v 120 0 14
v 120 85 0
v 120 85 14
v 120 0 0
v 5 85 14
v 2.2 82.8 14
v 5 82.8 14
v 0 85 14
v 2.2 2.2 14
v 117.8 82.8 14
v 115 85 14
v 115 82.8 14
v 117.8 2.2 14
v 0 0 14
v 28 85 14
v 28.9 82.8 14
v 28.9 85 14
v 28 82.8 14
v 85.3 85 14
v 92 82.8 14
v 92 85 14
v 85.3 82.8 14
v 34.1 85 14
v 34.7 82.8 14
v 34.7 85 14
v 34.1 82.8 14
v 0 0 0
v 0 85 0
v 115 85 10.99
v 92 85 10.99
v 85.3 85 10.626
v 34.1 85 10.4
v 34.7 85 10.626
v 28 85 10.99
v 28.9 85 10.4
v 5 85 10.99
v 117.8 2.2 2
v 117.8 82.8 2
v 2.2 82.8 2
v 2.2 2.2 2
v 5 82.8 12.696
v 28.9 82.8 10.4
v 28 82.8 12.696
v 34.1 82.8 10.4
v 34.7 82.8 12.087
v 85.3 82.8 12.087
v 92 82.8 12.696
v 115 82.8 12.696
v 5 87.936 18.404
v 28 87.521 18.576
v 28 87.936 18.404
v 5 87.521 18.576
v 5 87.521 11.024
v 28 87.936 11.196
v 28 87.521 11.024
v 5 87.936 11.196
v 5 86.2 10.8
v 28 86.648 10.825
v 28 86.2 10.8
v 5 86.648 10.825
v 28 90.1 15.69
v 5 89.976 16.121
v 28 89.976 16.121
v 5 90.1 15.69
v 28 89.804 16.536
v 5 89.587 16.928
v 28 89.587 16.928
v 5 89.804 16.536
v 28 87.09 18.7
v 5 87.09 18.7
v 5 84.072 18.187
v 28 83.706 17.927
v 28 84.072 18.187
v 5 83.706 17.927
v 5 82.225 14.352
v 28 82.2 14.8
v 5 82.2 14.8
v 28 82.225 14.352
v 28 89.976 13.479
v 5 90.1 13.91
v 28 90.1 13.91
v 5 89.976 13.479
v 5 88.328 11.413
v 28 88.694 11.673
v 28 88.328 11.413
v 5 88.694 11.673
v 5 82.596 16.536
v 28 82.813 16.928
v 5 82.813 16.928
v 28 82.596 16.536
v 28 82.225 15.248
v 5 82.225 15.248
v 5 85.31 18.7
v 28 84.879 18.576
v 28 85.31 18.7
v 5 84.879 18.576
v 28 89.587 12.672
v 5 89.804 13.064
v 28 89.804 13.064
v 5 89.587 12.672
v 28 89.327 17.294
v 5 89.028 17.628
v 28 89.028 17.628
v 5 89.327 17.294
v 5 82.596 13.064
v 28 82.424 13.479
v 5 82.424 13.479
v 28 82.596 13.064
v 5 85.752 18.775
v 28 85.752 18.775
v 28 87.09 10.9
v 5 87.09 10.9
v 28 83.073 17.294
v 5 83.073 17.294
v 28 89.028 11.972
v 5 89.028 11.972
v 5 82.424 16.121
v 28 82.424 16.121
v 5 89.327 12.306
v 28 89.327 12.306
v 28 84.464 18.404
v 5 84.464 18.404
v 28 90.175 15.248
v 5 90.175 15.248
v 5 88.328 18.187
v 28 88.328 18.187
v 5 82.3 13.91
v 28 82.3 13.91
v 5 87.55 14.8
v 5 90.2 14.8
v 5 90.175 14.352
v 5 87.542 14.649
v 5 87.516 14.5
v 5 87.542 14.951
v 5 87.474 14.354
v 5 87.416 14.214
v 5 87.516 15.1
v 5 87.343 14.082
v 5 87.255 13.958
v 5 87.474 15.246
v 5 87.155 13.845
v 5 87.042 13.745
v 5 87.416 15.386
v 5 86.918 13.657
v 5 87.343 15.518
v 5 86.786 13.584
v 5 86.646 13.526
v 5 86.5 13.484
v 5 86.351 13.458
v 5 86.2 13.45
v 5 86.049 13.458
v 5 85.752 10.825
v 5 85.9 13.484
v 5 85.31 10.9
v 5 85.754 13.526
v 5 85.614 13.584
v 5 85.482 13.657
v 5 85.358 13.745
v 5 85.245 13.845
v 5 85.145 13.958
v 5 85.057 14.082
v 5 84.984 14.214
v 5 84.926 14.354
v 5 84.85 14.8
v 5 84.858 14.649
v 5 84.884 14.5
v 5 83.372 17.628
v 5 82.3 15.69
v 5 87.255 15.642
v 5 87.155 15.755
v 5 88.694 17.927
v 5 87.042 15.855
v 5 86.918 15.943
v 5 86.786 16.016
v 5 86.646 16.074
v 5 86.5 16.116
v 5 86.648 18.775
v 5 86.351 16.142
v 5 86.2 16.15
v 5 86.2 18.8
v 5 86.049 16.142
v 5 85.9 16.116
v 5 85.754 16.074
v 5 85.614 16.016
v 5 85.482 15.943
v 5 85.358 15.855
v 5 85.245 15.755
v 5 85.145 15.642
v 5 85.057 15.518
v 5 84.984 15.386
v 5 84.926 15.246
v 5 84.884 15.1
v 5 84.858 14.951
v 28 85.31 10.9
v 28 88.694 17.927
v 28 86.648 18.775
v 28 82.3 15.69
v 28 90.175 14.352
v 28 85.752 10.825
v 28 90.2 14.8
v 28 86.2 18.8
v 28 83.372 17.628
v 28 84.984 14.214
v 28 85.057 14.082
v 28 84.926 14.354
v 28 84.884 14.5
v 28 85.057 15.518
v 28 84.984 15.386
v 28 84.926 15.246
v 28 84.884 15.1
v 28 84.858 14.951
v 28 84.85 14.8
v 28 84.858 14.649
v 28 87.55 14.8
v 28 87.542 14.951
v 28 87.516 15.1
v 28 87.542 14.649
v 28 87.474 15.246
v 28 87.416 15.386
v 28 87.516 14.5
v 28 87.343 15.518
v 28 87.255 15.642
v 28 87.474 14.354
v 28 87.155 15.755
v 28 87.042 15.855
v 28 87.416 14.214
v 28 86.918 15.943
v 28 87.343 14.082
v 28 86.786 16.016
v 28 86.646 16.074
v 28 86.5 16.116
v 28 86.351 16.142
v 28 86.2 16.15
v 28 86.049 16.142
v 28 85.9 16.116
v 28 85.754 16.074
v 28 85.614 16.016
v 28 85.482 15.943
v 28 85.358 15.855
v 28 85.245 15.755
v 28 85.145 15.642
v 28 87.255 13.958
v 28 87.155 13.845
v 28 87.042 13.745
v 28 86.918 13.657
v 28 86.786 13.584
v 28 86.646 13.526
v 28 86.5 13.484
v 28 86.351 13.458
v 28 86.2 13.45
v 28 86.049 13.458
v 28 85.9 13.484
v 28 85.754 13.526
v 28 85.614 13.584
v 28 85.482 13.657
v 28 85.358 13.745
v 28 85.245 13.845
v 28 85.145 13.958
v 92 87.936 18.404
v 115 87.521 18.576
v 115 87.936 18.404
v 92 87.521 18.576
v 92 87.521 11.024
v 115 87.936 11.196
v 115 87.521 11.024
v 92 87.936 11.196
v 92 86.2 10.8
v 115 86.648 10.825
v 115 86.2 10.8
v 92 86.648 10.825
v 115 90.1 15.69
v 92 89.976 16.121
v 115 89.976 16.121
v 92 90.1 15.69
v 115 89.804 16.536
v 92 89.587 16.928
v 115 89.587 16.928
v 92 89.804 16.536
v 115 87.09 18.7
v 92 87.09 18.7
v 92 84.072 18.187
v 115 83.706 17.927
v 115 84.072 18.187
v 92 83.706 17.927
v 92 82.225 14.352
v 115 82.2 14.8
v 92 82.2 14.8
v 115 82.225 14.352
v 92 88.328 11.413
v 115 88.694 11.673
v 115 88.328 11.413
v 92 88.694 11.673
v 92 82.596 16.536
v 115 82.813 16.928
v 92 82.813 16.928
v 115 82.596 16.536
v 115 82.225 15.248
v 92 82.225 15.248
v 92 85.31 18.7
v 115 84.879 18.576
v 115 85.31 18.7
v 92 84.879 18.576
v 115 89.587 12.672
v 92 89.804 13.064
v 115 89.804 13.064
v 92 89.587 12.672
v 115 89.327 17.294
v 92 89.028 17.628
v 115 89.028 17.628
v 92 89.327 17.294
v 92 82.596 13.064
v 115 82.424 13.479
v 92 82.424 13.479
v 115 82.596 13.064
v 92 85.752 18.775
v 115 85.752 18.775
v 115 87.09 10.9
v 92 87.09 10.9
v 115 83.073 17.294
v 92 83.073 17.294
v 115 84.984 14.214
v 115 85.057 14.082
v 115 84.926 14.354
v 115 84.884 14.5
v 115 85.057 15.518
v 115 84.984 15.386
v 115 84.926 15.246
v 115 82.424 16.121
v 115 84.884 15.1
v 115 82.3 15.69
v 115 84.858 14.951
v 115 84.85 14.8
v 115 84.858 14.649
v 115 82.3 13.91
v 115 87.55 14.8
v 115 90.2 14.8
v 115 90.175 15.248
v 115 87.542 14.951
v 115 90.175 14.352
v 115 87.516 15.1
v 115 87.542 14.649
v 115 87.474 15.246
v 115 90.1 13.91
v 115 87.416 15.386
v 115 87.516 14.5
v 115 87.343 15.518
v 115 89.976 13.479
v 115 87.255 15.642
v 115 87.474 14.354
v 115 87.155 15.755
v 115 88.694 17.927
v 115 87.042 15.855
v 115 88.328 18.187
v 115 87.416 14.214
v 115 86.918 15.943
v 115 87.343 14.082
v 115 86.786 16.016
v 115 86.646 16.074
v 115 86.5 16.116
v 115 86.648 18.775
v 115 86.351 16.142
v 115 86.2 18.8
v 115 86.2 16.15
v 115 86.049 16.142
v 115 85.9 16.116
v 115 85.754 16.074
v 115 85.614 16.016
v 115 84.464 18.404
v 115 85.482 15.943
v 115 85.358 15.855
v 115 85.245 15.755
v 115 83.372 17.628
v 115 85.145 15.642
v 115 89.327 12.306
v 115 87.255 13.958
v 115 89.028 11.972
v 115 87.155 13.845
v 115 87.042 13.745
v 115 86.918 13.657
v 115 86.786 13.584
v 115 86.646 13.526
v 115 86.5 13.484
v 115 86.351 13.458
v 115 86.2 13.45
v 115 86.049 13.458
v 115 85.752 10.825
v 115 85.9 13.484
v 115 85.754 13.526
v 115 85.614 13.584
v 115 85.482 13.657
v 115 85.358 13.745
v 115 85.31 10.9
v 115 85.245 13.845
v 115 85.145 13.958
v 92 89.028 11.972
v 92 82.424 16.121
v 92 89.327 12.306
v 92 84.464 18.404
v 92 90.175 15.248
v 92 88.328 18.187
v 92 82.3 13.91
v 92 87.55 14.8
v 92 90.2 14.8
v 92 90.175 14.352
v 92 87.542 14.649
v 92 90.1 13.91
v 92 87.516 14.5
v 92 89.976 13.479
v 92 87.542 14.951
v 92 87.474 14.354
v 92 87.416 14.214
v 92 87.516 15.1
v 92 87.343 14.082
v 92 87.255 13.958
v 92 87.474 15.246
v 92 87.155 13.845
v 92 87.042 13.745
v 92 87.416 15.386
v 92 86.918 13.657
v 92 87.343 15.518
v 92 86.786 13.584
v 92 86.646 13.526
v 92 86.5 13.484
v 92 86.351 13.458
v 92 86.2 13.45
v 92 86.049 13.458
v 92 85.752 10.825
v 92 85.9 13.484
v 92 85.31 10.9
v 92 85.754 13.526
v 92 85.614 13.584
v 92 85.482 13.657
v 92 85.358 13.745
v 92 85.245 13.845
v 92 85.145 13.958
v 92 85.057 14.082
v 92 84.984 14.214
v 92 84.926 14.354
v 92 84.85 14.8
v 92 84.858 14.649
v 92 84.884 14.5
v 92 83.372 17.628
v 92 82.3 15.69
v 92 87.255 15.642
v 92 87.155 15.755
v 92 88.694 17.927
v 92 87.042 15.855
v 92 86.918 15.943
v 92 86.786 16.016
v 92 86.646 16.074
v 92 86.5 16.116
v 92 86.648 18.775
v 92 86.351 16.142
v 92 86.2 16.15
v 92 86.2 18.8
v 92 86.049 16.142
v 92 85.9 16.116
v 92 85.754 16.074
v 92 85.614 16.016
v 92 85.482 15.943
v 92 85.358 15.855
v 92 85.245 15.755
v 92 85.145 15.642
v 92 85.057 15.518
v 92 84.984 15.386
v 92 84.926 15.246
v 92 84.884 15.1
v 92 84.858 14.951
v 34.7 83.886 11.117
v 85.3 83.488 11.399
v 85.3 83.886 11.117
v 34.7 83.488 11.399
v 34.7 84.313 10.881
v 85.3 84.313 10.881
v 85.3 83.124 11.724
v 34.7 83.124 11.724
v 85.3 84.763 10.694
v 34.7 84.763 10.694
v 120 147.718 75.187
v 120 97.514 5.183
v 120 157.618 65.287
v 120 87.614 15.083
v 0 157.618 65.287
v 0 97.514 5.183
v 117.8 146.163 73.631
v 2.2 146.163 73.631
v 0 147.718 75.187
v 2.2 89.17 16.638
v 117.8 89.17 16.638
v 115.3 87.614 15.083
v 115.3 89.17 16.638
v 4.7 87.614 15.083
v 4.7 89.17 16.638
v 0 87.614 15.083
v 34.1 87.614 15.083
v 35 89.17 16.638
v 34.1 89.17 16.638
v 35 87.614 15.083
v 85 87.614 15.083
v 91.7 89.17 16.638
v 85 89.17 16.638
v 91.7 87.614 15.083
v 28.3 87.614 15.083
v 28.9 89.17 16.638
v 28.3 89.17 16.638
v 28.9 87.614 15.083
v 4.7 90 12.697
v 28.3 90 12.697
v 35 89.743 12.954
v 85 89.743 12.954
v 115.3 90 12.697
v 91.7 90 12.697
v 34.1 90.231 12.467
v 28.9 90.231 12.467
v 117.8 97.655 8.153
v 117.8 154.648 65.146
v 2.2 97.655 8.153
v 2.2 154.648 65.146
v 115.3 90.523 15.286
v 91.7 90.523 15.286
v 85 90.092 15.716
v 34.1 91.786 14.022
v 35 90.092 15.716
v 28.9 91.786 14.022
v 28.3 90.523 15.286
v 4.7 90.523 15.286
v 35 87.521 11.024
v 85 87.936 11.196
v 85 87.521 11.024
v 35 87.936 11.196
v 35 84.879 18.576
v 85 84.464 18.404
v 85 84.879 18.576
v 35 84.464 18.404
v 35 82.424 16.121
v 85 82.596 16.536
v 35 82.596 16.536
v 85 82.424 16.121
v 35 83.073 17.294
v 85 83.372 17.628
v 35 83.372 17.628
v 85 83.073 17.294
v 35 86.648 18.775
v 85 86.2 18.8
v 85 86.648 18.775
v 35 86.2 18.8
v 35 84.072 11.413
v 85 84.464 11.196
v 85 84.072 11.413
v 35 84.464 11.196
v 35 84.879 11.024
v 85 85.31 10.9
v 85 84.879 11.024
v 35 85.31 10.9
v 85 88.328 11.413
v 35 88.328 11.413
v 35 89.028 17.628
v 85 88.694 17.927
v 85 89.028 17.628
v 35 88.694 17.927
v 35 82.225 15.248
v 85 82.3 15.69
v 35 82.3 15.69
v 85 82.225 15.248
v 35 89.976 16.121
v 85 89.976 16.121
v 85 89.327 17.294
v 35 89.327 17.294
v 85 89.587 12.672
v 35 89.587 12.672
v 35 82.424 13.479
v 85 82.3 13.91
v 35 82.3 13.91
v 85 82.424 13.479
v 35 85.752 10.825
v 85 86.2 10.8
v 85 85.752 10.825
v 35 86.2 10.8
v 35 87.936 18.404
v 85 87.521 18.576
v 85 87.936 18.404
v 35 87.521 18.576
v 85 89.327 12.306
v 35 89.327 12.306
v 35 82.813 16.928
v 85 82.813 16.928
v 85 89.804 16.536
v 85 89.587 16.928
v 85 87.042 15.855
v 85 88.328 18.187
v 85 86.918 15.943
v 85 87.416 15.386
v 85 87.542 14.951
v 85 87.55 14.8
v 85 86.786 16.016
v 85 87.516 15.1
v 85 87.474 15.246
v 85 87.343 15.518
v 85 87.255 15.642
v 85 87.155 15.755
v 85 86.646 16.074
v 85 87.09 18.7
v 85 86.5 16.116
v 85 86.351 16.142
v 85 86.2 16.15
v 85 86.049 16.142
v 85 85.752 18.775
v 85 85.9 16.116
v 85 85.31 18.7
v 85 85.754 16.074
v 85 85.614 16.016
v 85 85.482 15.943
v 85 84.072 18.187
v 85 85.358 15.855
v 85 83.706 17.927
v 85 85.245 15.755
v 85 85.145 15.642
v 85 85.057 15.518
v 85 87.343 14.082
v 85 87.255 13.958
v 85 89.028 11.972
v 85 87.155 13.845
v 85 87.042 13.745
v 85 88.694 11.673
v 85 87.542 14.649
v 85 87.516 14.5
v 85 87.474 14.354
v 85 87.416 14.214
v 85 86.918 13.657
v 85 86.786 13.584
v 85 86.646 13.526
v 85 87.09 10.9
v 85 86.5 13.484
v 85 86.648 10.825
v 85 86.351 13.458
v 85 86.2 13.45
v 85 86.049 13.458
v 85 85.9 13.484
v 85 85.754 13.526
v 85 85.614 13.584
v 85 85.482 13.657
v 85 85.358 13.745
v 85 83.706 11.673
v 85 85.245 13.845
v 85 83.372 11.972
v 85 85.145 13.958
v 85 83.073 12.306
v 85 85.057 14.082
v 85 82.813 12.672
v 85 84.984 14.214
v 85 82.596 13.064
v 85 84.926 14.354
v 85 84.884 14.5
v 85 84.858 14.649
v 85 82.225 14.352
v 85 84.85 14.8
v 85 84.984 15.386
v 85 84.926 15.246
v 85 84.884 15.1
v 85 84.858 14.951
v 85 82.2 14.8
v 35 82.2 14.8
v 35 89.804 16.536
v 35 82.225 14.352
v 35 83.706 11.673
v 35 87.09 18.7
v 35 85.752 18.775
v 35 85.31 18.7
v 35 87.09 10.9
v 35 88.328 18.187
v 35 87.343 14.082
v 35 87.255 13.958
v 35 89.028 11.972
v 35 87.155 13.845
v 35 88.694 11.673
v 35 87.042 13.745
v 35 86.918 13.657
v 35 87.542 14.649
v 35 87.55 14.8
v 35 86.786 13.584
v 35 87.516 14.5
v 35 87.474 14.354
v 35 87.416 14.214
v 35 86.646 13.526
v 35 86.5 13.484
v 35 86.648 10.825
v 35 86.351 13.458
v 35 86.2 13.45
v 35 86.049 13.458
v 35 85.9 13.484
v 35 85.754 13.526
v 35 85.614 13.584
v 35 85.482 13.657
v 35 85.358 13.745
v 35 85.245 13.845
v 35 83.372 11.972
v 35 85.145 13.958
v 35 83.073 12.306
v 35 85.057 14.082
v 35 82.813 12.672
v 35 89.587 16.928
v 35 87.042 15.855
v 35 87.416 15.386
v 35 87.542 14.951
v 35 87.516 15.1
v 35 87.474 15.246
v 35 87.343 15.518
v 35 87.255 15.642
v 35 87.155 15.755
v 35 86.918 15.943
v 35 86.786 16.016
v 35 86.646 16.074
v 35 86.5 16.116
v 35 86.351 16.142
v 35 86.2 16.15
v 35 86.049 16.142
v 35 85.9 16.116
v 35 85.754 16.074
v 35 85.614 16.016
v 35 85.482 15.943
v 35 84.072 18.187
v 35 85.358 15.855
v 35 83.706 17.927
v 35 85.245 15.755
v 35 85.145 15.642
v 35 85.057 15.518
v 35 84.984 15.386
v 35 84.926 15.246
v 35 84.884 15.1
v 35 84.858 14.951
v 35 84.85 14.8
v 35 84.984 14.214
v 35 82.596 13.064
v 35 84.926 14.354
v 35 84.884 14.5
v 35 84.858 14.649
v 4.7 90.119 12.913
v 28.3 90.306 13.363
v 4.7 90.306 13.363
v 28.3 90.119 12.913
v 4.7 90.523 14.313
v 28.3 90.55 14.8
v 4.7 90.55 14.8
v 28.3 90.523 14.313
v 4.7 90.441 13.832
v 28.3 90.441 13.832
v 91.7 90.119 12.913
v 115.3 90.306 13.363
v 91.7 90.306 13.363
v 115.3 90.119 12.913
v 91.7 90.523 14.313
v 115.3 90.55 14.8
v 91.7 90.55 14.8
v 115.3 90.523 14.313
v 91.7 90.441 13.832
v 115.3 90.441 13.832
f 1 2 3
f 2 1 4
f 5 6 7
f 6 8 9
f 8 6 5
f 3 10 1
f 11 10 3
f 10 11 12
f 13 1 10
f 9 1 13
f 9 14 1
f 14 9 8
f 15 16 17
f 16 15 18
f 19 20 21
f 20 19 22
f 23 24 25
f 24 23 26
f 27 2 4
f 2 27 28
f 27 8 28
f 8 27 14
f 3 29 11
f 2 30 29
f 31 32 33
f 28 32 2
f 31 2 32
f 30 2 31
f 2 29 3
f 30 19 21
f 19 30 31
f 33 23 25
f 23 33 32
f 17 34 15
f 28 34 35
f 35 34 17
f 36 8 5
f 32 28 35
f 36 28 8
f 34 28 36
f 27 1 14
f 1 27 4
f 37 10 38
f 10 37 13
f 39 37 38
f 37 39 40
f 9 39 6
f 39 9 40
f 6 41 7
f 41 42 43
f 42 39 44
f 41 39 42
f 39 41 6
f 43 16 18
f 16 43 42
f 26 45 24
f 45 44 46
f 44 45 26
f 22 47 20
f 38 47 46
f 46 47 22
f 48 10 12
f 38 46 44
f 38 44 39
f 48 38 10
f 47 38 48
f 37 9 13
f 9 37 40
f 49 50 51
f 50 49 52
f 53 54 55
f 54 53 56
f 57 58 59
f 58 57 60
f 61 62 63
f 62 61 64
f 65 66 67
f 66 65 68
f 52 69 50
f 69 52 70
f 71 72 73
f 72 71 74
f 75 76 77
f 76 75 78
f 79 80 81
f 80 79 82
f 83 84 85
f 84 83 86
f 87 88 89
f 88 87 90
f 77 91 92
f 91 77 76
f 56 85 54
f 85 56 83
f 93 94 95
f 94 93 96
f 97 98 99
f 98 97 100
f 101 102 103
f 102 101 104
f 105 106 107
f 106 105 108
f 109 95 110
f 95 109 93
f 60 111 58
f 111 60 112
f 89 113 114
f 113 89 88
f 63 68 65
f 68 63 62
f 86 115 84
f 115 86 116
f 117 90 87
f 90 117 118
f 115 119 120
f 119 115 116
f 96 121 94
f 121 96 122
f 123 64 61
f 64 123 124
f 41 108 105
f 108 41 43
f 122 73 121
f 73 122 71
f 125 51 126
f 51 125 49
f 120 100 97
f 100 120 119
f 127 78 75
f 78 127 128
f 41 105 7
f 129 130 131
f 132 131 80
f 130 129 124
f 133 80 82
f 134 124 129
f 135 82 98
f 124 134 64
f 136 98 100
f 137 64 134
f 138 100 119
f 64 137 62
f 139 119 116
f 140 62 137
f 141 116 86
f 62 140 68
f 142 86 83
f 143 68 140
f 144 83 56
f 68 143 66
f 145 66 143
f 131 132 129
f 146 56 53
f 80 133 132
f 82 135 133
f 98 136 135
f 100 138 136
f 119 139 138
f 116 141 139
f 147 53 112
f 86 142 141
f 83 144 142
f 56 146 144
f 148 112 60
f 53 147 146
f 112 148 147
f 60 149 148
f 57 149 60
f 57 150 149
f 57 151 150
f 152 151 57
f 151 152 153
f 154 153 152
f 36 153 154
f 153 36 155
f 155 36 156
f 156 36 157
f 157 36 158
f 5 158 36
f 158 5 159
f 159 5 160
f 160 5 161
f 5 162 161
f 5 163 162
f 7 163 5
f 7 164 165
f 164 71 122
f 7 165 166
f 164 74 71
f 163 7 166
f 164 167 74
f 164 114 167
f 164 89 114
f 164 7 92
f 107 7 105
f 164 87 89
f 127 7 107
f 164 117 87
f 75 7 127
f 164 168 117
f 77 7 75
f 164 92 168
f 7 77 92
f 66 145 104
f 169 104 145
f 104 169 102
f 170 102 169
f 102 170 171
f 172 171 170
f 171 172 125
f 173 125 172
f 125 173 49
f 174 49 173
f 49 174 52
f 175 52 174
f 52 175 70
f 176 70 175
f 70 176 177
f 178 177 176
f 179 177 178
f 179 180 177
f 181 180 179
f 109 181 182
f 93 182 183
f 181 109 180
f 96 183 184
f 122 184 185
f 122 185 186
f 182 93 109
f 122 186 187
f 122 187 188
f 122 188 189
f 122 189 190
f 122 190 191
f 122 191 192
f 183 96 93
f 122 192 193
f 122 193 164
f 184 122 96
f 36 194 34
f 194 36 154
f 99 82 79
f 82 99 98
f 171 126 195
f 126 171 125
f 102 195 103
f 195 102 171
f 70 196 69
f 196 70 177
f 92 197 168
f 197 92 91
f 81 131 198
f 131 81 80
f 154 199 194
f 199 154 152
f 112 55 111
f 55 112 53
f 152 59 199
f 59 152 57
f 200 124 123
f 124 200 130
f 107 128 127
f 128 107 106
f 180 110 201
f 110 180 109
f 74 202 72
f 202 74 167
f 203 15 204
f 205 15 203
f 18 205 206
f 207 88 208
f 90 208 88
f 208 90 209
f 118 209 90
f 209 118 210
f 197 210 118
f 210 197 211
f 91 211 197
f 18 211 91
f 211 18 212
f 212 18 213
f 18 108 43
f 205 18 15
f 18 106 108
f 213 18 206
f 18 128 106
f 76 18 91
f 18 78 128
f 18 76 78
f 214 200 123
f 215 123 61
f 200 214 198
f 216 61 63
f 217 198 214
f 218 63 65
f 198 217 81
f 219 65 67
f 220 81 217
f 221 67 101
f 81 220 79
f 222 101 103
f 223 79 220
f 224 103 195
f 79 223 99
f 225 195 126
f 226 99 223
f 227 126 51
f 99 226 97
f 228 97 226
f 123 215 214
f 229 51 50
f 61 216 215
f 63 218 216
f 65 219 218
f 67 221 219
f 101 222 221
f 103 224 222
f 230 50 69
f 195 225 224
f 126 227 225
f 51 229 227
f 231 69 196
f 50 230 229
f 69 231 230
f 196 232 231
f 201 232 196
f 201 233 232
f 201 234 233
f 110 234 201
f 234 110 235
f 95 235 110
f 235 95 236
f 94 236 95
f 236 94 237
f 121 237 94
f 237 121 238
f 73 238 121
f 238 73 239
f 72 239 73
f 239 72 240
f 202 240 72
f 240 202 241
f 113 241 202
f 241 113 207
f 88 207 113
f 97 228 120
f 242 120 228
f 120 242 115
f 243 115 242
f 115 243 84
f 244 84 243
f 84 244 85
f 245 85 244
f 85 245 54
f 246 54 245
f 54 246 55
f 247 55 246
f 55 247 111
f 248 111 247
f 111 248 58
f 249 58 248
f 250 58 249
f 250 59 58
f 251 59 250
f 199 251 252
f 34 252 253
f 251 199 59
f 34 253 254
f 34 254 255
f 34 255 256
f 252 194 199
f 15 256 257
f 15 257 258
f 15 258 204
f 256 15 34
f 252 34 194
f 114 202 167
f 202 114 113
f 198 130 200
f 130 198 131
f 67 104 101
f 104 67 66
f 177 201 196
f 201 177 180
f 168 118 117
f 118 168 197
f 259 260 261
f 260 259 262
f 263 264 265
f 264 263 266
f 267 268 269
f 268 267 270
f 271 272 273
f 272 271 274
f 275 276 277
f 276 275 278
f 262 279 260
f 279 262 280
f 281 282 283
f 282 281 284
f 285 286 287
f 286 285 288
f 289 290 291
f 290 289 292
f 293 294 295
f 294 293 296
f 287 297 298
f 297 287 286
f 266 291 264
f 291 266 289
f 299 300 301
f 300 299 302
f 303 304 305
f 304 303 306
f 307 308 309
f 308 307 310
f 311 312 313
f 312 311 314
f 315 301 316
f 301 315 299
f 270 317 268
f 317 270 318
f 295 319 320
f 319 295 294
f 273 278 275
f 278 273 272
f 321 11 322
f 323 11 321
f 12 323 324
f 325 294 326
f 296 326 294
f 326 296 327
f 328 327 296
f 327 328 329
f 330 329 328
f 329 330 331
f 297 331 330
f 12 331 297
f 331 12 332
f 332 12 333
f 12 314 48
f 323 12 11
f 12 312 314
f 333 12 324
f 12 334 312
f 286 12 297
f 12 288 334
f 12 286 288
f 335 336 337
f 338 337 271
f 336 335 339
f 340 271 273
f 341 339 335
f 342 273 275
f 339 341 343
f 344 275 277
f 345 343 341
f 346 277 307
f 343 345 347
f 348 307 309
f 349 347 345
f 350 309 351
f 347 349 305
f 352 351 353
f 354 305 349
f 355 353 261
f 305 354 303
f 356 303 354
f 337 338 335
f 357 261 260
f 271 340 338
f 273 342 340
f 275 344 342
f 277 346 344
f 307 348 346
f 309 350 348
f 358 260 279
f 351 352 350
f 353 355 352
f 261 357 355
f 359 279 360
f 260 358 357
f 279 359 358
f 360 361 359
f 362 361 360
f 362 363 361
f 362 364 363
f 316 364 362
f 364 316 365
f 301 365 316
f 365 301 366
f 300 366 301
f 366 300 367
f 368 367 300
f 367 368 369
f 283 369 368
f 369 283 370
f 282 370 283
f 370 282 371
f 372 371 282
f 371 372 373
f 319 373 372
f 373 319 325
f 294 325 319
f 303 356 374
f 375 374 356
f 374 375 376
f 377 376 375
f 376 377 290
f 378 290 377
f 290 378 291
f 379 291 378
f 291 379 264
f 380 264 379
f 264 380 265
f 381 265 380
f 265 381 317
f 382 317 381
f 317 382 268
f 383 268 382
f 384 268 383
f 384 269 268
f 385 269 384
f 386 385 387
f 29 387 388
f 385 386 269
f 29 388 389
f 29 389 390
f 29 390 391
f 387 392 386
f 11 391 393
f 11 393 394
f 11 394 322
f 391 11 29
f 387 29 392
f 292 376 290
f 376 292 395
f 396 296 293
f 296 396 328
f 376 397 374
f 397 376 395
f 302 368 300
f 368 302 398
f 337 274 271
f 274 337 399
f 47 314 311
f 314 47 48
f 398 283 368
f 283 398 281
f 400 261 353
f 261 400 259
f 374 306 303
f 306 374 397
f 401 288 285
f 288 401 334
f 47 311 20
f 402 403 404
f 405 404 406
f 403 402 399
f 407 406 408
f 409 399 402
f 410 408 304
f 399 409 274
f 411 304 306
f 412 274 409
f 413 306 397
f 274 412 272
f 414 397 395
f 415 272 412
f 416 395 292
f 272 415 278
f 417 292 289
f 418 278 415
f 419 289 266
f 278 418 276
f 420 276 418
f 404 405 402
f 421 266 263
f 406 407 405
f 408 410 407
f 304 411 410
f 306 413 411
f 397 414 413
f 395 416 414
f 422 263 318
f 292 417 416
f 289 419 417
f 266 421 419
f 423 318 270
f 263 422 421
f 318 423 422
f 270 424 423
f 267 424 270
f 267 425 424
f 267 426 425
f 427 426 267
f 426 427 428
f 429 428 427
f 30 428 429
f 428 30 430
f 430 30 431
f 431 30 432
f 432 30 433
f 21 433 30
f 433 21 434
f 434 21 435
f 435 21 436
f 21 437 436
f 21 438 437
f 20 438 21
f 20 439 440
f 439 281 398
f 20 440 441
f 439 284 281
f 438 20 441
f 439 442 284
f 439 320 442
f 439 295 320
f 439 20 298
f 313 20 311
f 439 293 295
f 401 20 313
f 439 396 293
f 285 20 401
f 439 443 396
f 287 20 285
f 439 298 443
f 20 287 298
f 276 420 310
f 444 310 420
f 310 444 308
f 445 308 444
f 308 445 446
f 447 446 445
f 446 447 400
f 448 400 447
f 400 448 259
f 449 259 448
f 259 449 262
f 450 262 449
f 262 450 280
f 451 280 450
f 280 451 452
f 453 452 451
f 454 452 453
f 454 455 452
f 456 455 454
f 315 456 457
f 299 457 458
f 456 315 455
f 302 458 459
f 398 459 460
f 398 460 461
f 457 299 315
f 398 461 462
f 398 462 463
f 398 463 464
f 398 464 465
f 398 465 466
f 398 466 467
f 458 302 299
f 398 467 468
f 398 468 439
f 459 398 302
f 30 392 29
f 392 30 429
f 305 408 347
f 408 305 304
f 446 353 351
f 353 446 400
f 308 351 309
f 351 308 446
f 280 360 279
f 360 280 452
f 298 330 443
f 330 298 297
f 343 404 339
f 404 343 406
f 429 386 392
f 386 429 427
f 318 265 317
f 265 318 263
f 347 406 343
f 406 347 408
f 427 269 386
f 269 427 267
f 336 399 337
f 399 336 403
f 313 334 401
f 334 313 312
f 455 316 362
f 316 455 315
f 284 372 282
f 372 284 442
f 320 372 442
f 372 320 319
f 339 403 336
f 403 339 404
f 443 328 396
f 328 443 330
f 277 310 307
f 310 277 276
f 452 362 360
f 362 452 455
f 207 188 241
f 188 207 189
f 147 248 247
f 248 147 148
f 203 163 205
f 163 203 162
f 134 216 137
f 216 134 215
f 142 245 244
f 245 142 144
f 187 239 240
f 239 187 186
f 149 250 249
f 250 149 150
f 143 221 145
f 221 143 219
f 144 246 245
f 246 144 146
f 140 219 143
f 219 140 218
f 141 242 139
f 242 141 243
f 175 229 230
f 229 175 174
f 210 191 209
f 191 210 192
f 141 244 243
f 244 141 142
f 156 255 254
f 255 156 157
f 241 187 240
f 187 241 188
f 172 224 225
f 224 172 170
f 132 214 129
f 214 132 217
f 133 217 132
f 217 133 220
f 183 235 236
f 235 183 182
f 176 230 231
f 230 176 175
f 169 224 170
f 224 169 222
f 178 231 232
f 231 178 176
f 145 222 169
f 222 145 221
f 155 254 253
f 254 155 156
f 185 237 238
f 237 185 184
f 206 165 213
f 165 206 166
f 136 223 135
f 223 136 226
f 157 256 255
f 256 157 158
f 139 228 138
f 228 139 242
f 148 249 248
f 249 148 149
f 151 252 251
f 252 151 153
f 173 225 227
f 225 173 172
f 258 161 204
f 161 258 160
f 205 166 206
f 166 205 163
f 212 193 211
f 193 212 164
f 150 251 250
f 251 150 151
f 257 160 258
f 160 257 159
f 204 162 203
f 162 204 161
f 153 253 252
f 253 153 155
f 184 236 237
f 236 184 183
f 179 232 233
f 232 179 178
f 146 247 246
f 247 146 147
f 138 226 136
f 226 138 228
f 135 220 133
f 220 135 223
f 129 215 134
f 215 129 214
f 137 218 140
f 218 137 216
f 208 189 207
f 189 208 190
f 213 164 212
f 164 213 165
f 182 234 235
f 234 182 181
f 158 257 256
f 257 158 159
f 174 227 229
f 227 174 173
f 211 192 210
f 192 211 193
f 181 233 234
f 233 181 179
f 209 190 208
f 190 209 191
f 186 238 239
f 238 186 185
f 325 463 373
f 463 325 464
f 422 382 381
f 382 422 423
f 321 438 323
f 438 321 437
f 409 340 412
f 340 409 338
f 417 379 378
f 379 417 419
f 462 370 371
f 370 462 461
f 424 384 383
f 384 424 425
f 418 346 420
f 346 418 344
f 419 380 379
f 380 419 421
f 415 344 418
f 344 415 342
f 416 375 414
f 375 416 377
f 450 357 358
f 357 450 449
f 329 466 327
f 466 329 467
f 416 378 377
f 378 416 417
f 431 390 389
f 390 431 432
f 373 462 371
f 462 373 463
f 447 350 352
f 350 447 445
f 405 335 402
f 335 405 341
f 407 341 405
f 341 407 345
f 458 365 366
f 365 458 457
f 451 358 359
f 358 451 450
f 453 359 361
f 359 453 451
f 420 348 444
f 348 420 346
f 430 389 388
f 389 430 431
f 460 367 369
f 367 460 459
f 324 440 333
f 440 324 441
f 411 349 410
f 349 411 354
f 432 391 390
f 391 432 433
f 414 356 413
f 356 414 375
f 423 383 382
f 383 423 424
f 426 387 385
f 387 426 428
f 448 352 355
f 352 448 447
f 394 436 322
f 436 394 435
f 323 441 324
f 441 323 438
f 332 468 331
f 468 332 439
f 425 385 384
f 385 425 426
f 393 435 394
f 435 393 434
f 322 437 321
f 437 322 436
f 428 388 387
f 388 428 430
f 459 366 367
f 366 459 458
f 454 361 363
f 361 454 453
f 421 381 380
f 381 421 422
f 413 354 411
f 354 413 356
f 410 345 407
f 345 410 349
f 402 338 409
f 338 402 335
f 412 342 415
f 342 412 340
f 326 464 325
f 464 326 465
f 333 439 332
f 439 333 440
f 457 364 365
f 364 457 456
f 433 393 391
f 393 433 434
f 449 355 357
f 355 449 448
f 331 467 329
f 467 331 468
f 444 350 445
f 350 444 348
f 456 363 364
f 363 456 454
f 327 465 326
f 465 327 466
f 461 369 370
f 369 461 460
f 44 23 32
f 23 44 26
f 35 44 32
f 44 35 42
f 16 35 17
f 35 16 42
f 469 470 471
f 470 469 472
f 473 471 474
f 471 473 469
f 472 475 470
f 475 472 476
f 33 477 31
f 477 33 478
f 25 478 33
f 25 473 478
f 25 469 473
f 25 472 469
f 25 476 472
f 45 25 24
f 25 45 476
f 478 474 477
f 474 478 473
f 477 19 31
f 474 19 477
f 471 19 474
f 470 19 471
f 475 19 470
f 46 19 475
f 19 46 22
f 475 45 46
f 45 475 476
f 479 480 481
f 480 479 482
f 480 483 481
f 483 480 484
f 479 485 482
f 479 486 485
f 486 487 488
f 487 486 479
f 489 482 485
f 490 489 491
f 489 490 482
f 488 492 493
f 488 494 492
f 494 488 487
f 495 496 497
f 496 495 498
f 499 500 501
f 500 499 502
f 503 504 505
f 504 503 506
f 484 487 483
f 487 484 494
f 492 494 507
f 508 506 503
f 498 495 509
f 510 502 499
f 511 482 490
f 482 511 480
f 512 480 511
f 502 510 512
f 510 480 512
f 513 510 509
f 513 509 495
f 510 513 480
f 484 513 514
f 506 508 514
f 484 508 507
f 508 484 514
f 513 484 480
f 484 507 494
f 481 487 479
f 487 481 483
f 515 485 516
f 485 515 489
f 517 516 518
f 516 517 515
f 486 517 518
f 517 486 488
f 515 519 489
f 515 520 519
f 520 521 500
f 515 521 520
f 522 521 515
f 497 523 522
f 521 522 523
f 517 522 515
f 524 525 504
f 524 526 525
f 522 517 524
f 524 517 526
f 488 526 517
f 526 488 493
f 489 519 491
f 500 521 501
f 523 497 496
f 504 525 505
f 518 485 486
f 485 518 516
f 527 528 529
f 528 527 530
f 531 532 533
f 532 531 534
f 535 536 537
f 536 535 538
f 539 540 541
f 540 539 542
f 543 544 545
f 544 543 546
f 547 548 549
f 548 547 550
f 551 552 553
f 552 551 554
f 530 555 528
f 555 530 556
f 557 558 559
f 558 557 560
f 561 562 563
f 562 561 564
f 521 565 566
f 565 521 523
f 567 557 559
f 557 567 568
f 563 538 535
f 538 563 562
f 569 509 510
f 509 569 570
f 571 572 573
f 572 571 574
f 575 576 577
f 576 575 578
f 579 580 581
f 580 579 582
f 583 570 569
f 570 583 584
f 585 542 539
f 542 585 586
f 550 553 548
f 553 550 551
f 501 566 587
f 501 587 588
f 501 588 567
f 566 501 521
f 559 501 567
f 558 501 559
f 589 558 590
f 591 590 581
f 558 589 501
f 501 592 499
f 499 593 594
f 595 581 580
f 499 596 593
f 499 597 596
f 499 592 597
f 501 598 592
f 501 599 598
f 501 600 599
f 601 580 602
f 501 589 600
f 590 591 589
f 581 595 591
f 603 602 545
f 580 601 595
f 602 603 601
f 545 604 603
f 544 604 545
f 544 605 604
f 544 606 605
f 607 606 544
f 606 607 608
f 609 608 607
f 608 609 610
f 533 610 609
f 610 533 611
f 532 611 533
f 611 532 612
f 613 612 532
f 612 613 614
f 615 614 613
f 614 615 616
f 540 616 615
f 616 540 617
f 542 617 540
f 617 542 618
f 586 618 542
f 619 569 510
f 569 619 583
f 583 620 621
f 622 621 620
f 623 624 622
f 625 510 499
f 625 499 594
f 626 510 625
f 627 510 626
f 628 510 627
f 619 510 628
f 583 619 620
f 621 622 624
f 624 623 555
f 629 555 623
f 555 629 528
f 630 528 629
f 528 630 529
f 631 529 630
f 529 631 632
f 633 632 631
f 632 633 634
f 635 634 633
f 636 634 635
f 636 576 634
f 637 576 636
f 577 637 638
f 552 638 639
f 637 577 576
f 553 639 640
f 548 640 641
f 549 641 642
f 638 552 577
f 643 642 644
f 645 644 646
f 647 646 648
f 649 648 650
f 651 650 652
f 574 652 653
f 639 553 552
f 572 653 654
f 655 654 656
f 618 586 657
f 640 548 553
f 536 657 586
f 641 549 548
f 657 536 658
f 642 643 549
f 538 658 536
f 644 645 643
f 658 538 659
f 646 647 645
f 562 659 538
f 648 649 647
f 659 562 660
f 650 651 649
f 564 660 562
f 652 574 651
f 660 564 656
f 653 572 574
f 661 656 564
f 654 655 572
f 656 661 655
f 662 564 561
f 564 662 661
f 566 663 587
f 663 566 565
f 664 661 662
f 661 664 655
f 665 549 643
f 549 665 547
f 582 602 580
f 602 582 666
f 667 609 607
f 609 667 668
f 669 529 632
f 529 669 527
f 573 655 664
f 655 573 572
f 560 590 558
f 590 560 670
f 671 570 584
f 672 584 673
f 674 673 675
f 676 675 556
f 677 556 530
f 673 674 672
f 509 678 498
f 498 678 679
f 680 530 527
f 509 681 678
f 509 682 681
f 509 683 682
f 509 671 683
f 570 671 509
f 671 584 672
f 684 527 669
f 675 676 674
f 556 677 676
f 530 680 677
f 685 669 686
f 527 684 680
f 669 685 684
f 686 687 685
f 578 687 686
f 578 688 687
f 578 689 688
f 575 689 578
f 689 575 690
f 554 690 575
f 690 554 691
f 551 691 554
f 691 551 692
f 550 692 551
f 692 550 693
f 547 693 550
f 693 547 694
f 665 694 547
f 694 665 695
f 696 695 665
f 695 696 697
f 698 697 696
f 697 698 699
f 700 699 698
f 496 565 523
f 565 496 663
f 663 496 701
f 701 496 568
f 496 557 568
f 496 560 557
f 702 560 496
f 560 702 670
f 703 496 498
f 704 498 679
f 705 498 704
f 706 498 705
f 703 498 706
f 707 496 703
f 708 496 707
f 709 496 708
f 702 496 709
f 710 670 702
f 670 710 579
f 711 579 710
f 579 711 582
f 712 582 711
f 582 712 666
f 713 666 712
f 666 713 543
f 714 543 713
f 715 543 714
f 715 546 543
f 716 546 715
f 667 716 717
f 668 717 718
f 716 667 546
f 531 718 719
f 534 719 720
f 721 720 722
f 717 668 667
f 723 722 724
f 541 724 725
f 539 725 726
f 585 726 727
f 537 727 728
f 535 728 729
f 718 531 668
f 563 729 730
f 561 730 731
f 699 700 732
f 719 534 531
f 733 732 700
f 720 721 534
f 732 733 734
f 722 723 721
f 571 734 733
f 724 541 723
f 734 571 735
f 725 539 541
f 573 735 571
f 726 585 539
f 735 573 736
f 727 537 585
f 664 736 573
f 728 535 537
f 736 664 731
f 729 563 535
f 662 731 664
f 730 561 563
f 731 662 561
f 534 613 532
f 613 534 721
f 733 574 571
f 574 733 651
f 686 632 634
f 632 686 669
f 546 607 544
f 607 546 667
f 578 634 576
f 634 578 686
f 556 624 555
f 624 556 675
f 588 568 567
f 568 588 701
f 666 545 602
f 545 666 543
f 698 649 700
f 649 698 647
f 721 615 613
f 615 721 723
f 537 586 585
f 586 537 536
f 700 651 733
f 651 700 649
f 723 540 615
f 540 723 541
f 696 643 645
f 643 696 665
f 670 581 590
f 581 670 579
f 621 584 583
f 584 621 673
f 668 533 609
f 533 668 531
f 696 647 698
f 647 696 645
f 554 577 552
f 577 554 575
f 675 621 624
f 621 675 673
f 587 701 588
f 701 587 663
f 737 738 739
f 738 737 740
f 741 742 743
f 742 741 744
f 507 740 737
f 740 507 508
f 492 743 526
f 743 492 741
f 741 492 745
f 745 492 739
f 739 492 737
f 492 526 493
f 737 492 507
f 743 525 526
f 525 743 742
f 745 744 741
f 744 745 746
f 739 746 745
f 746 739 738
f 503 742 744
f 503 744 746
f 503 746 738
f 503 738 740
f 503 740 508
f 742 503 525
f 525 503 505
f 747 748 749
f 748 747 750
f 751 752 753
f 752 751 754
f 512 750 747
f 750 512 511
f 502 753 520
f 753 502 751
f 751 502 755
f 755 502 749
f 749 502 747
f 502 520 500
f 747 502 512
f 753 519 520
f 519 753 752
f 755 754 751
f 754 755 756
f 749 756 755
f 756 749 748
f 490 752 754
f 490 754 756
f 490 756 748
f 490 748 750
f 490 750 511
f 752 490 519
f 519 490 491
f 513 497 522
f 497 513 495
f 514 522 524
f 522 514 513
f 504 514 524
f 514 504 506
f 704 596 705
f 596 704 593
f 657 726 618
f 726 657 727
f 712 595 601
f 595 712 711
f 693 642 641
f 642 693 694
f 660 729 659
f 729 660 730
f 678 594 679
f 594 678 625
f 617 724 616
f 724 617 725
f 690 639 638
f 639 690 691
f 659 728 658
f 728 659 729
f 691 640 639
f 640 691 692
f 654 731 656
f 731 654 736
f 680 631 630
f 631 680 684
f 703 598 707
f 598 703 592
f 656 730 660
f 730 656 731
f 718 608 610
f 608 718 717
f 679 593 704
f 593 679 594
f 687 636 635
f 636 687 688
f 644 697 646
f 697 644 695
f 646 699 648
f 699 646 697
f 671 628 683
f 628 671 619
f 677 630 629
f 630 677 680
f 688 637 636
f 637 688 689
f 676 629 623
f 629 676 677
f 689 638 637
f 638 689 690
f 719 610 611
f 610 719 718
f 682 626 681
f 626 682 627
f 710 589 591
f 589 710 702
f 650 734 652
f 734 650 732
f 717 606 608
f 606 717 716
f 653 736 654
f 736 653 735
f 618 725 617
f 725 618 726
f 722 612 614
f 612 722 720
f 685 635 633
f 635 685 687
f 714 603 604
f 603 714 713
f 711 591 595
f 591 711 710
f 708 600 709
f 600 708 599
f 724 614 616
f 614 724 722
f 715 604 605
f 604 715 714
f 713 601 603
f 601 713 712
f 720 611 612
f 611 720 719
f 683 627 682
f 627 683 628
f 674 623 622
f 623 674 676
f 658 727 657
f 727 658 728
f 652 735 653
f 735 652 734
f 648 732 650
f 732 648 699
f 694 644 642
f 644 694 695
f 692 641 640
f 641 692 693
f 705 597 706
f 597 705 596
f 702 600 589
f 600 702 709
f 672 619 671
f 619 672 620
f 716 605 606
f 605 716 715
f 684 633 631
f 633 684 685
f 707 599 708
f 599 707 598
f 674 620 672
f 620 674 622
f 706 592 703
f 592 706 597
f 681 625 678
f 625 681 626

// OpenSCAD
// file: lid_shell.scad
// Generated by Mecha-Splicer: clamshell_terminal v1
// Dimension-based CAD ONLY: unknown PCB screw positions, USB access and real fit.
// lid / display tray (down-facing open pocket at closed angle), all dimensions in mm
$fn=56;
W=120.0; D=85.0; wall=2.2; floor=2.0;
HBASE=14.0; HLID=14.0; gap=1.6;
hy=86.2; hz=14.8;
kr=4.0; bore=2.7;

module lid_shell() {
  difference() {
    union() {
      difference() {
        translate([0,0,15.6]) cube([W,D,HLID]);
        translate([wall,wall,15.5]) cube([W-2*wall,D-2*wall,HLID-floor+0.1]);
      }
      translate([35.0,hy,hz]) rotate([0,90,0]) cylinder(h=50.0,r=kr);
    }
    // Lid-side four-wire cable entry (opposed to left-side base slot)
    translate([28.9,82.7,15.5]) cube([5.2,2.4000000000000004,3.8000000000000003]);
    // Relief for two base knuckles entering lid rear wall at all open angles
    for (x=[4.7,91.7]) translate([x,hy,hz]) rotate([0,90,0]) cylinder(h=23.6,r=4.35);
    translate([34.8,hy,hz]) rotate([0,90,0]) cylinder(h=50.4,d=bore);
  }
}
lid_shell();
// file: base_shell.scad
// Generated by Mecha-Splicer: clamshell_terminal v1
// Dimension-based CAD ONLY: unknown PCB screw positions, USB access and real fit.
// base / keyboard tray, all dimensions in mm
$fn=56;
W=120.0; D=85.0; wall=2.2; floor=2.0;
HBASE=14.0; HLID=14.0; gap=1.6;
hy=86.2; hz=14.8;
kr=4.0; bore=2.7;

module base_shell() {
  difference() {
    union() {
      difference() {
        cube([W,D,HBASE]);
        translate([wall,wall,floor]) cube([W-2*wall,D-2*wall,HBASE+1]);
      }
      for (x=[5.0,92.0]) translate([x,hy,hz]) rotate([0,90,0]) cylinder(h=23.0,r=kr);
    }
    // Strain-relief entry only: actual cable bend life remains untested
    translate([28.9,82.7,10.4]) cube([5.2,2.4000000000000004,3.7]);
    // Clearance pocket for opposite lid knuckle through base rear wall
    translate([34.7,hy,hz]) rotate([0,90,0]) cylinder(h=50.6,r=4.35);
    // Through-bore including relief outside the short segments
    for (x=[4.8,91.8]) translate([x,hy,hz]) rotate([0,90,0]) cylinder(h=23.4,d=bore);
  }
}
base_shell();
// main file
// Mecha-Splicer assembly preview only. Angle 0=closed; -135=open.
use <base_shell.scad>
use <lid_shell.scad>
angle_deg = -135.0;
hy=86.2; hz=14.8;
color([0.17,0.23,0.31]) base_shell();
color([0.42,0.53,0.61])
translate([0,hy,hz]) rotate([angle_deg,0,0])
  translate([0,-hy,-hz]) lid_shell();
